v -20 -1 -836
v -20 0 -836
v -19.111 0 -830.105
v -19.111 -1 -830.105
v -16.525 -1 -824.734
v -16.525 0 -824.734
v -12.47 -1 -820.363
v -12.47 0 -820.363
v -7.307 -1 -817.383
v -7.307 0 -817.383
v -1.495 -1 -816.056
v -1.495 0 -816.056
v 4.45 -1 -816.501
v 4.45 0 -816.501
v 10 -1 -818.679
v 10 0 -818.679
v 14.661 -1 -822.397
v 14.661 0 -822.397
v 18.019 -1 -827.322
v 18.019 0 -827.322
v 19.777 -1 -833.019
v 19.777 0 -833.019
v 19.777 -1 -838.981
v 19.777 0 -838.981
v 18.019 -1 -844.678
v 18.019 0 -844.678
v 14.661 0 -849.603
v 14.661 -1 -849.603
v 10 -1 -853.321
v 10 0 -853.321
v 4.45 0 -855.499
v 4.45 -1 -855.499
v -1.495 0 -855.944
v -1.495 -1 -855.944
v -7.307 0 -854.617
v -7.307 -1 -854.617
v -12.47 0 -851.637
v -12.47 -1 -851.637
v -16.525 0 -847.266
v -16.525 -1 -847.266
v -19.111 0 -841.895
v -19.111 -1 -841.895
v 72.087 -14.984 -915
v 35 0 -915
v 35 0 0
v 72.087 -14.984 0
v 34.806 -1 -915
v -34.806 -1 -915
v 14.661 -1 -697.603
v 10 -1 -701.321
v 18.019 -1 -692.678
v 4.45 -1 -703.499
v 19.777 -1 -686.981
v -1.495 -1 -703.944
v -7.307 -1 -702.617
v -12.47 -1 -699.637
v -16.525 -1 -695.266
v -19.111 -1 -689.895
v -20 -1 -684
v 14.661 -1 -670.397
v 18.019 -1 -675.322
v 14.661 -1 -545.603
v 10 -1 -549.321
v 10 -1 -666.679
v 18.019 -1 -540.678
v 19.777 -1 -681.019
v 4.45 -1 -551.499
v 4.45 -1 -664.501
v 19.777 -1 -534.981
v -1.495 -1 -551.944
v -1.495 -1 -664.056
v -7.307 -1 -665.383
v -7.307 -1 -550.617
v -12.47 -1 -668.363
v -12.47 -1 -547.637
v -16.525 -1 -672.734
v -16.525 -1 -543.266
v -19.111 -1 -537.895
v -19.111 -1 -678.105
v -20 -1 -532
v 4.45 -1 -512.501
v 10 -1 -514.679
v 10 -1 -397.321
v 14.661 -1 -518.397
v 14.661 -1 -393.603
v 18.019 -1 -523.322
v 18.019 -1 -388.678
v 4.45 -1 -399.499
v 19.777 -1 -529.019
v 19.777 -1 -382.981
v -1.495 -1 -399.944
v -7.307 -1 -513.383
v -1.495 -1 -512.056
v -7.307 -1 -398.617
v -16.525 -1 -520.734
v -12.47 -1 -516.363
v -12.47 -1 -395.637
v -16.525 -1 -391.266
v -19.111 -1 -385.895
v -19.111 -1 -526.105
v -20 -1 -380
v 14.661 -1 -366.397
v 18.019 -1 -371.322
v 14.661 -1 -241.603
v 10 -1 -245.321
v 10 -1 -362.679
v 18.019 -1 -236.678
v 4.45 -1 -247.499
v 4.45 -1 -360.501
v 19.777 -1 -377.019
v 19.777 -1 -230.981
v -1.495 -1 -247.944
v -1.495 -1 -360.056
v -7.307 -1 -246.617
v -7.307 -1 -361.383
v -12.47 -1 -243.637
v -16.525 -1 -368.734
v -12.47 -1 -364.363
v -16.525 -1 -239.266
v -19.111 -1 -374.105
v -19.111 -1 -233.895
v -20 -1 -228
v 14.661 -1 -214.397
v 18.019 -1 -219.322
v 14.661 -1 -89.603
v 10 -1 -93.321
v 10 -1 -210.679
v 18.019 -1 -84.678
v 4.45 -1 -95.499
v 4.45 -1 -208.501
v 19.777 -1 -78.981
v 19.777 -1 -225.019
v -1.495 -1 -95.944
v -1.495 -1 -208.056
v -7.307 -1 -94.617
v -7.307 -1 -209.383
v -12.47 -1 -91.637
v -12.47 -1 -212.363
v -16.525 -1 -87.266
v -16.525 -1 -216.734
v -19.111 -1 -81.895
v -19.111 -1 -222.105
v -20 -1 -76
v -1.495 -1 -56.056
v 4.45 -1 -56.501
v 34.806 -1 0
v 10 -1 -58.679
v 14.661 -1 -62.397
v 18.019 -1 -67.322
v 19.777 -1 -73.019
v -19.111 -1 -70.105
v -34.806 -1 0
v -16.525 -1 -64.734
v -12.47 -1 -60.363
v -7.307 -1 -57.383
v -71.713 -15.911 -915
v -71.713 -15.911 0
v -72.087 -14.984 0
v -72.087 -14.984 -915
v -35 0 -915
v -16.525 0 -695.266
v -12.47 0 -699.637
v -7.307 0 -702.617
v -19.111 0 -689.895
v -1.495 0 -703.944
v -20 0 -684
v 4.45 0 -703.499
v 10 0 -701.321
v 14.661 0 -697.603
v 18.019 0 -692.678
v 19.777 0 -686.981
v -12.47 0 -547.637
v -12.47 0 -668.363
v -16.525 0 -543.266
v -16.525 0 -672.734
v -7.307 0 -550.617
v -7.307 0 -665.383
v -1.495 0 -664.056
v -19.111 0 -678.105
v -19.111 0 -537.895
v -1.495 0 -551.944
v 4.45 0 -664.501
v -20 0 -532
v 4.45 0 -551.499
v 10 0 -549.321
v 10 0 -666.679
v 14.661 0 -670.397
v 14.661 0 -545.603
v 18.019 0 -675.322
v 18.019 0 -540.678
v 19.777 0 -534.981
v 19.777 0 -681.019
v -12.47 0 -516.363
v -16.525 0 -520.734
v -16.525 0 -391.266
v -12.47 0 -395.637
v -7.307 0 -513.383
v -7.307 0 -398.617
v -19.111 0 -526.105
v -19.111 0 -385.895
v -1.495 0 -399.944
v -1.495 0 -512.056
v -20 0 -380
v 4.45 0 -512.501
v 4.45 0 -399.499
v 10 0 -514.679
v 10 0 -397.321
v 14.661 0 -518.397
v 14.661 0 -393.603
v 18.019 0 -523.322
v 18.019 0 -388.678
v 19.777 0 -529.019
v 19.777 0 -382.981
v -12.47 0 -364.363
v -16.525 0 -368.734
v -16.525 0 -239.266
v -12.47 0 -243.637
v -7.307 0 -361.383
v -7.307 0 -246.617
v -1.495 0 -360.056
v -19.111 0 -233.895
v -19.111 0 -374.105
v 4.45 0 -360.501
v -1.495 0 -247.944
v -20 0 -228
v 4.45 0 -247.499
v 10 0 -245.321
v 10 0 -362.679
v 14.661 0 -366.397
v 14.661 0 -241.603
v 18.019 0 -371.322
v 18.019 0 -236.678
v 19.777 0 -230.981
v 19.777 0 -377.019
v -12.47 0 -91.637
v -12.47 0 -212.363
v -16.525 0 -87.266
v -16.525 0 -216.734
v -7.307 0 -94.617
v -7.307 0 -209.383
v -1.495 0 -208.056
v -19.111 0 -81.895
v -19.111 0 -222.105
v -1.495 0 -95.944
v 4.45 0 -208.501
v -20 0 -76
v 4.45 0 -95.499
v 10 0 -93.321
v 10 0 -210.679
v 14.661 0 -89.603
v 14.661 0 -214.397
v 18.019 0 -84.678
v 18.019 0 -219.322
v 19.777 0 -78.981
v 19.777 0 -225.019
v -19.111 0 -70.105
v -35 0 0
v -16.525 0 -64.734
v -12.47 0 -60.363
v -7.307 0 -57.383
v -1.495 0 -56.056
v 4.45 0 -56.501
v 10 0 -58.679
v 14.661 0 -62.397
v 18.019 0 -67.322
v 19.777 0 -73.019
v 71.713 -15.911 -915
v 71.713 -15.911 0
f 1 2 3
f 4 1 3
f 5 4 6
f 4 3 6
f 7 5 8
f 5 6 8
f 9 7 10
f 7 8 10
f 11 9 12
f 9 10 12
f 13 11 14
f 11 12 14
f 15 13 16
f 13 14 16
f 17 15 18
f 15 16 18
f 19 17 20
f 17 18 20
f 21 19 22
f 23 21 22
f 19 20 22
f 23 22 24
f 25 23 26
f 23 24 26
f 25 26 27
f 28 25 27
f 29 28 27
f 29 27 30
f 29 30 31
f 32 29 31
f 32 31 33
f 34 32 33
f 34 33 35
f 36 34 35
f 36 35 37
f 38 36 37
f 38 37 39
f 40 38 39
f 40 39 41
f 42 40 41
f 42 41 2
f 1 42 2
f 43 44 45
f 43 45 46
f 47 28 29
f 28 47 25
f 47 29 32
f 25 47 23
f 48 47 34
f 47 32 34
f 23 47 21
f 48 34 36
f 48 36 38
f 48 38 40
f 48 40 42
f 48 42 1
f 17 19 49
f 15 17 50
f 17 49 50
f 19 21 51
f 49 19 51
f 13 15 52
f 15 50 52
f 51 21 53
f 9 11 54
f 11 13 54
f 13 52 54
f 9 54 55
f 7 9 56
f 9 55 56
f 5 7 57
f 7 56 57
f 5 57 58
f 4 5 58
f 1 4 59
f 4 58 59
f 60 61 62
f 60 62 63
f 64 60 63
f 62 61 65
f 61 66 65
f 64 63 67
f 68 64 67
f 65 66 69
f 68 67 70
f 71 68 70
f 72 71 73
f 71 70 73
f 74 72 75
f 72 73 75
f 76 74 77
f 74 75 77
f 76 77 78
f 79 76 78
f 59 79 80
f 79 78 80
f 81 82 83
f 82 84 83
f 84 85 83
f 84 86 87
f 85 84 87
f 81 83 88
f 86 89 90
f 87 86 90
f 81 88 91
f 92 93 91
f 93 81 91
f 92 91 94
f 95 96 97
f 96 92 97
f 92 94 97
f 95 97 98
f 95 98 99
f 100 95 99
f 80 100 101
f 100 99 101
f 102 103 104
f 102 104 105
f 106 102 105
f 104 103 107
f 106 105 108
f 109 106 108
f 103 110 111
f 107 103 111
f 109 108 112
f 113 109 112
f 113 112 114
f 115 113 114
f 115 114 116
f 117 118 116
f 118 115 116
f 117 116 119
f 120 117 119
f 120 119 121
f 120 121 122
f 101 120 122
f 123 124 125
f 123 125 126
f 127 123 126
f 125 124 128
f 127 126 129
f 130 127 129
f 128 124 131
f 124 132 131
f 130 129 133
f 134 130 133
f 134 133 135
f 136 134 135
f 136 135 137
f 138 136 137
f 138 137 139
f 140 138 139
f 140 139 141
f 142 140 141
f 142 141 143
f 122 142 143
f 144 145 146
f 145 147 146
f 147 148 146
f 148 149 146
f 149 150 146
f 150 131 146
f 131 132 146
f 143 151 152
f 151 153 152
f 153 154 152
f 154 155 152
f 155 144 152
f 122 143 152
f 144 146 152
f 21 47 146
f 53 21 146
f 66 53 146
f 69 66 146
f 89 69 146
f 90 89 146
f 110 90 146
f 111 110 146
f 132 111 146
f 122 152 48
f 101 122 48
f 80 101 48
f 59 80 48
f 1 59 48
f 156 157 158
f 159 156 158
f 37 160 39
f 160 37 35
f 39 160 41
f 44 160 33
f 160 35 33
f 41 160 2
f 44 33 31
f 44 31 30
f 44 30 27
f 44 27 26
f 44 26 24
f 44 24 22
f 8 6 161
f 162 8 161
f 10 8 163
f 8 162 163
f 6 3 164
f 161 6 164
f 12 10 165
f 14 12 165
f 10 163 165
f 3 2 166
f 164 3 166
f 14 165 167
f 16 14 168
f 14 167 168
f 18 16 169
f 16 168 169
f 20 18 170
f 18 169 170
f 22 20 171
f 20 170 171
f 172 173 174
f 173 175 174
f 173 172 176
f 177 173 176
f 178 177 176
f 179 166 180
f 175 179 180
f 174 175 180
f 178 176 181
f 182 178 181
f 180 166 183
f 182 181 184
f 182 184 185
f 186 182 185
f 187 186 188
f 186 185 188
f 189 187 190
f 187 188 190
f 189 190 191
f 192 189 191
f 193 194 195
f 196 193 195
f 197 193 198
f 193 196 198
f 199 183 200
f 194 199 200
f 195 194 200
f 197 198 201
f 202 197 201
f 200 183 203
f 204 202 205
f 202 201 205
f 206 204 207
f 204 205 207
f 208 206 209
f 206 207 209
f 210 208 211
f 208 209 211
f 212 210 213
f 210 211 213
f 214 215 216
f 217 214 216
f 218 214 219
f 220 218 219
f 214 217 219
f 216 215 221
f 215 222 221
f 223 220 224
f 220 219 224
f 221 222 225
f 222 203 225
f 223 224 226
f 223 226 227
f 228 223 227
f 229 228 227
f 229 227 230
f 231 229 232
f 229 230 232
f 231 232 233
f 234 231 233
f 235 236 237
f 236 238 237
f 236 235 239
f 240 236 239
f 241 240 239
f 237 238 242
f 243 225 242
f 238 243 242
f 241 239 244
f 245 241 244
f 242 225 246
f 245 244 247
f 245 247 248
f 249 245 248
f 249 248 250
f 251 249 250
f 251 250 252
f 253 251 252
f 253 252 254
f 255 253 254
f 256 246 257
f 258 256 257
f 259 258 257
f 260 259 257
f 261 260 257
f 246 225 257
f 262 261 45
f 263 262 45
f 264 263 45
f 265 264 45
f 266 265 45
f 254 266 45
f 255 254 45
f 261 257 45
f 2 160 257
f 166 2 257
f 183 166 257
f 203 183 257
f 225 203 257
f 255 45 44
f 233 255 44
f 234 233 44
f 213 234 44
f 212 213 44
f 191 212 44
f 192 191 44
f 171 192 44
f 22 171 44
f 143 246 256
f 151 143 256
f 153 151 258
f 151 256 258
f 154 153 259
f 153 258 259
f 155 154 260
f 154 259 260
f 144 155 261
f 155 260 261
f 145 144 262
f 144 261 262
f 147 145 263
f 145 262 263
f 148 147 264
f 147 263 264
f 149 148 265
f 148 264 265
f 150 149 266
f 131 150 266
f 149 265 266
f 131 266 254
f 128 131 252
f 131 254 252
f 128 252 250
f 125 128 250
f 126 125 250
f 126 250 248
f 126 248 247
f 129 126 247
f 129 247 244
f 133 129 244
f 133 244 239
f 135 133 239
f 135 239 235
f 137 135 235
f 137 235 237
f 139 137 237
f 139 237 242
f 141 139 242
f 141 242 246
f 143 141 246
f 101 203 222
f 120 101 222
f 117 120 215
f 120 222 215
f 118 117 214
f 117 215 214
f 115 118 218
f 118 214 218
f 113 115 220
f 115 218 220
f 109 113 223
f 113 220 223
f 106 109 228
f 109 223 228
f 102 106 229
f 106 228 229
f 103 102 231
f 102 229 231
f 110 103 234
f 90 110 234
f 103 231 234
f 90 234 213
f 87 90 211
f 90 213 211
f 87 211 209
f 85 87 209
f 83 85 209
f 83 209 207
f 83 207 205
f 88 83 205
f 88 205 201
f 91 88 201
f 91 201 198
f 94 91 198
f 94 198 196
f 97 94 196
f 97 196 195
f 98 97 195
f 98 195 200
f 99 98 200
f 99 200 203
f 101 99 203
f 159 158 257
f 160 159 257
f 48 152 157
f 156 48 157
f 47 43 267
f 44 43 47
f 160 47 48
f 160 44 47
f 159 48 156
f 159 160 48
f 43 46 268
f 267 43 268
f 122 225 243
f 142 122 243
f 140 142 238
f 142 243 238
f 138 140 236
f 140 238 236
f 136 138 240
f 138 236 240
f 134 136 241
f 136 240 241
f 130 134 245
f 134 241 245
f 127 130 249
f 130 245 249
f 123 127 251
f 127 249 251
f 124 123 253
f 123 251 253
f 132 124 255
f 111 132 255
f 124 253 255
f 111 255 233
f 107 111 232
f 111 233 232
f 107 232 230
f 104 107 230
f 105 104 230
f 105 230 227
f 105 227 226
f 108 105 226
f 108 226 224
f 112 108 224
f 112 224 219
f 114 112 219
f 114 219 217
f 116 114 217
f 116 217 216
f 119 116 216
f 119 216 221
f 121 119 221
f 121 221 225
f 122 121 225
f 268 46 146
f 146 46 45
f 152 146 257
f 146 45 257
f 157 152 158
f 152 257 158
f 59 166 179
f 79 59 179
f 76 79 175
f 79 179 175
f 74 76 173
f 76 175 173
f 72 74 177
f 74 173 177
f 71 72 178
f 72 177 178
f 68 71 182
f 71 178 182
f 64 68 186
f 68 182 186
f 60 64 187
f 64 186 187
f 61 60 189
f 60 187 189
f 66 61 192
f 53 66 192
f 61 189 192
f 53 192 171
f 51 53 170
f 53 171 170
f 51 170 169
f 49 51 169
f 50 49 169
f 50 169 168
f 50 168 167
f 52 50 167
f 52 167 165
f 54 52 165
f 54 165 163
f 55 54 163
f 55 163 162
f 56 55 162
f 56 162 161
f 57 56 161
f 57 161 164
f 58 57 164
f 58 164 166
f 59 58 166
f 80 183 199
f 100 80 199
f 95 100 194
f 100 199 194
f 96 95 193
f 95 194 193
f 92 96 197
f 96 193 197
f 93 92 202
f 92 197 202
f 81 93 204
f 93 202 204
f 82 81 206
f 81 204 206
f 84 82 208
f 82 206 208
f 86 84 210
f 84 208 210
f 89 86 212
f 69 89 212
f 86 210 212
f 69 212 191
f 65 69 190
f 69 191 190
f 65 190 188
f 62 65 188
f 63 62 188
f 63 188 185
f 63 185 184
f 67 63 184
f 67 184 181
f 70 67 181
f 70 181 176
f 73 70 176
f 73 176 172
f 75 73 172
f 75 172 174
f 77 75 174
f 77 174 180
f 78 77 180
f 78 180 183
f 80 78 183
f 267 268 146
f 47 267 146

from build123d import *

# Parameters (mm, degrees)
BOSS_EXTRUDE1_DEPTH = 915
SKETCH2_R           = 20
CUT_EXTRUDE1_DEPTH  = 1000


with BuildPart() as part:
    # Sketch1 → Boss-Extrude1 (new body)
    with BuildSketch(Plane.XY):
        Polygon((-35, 0), (35, 0), (72.087354183, -14.984263737), (71.712747589, -15.911447591), (34.805619691, -1), (-34.805619691, -1), (-71.712747589, -15.911447591), (-72.087354183, -14.984263737), align=None)
    extrude(amount=-BOSS_EXTRUDE1_DEPTH)

    # Sketch2 → Cut-Extrude1 (cut)
    with BuildSketch(Plane(origin=(0, 0, 0), x_dir=(1, 0, 0), z_dir=(0, 1, 0))):
        with Locations(Location((0, 76, 0), (0, 0, 180))):
            Circle(SKETCH2_R)
        with Locations(Location((0, 228, 0), (0, 0, 180))):
            Circle(SKETCH2_R)
        with Locations(Location((0, 380, 0), (0, 0, 180))):
            Circle(SKETCH2_R)
        with Locations(Location((0, 532, 0), (0, 0, 180))):
            Circle(SKETCH2_R)
        with Locations(Location((0, 684, 0), (0, 0, 180))):
            Circle(SKETCH2_R)
        with Locations(Location((0, 836, 0), (0, 0, 180))):
            Circle(SKETCH2_R)
    extrude(amount=-CUT_EXTRUDE1_DEPTH, mode=Mode.SUBTRACT)


solid = part.part
